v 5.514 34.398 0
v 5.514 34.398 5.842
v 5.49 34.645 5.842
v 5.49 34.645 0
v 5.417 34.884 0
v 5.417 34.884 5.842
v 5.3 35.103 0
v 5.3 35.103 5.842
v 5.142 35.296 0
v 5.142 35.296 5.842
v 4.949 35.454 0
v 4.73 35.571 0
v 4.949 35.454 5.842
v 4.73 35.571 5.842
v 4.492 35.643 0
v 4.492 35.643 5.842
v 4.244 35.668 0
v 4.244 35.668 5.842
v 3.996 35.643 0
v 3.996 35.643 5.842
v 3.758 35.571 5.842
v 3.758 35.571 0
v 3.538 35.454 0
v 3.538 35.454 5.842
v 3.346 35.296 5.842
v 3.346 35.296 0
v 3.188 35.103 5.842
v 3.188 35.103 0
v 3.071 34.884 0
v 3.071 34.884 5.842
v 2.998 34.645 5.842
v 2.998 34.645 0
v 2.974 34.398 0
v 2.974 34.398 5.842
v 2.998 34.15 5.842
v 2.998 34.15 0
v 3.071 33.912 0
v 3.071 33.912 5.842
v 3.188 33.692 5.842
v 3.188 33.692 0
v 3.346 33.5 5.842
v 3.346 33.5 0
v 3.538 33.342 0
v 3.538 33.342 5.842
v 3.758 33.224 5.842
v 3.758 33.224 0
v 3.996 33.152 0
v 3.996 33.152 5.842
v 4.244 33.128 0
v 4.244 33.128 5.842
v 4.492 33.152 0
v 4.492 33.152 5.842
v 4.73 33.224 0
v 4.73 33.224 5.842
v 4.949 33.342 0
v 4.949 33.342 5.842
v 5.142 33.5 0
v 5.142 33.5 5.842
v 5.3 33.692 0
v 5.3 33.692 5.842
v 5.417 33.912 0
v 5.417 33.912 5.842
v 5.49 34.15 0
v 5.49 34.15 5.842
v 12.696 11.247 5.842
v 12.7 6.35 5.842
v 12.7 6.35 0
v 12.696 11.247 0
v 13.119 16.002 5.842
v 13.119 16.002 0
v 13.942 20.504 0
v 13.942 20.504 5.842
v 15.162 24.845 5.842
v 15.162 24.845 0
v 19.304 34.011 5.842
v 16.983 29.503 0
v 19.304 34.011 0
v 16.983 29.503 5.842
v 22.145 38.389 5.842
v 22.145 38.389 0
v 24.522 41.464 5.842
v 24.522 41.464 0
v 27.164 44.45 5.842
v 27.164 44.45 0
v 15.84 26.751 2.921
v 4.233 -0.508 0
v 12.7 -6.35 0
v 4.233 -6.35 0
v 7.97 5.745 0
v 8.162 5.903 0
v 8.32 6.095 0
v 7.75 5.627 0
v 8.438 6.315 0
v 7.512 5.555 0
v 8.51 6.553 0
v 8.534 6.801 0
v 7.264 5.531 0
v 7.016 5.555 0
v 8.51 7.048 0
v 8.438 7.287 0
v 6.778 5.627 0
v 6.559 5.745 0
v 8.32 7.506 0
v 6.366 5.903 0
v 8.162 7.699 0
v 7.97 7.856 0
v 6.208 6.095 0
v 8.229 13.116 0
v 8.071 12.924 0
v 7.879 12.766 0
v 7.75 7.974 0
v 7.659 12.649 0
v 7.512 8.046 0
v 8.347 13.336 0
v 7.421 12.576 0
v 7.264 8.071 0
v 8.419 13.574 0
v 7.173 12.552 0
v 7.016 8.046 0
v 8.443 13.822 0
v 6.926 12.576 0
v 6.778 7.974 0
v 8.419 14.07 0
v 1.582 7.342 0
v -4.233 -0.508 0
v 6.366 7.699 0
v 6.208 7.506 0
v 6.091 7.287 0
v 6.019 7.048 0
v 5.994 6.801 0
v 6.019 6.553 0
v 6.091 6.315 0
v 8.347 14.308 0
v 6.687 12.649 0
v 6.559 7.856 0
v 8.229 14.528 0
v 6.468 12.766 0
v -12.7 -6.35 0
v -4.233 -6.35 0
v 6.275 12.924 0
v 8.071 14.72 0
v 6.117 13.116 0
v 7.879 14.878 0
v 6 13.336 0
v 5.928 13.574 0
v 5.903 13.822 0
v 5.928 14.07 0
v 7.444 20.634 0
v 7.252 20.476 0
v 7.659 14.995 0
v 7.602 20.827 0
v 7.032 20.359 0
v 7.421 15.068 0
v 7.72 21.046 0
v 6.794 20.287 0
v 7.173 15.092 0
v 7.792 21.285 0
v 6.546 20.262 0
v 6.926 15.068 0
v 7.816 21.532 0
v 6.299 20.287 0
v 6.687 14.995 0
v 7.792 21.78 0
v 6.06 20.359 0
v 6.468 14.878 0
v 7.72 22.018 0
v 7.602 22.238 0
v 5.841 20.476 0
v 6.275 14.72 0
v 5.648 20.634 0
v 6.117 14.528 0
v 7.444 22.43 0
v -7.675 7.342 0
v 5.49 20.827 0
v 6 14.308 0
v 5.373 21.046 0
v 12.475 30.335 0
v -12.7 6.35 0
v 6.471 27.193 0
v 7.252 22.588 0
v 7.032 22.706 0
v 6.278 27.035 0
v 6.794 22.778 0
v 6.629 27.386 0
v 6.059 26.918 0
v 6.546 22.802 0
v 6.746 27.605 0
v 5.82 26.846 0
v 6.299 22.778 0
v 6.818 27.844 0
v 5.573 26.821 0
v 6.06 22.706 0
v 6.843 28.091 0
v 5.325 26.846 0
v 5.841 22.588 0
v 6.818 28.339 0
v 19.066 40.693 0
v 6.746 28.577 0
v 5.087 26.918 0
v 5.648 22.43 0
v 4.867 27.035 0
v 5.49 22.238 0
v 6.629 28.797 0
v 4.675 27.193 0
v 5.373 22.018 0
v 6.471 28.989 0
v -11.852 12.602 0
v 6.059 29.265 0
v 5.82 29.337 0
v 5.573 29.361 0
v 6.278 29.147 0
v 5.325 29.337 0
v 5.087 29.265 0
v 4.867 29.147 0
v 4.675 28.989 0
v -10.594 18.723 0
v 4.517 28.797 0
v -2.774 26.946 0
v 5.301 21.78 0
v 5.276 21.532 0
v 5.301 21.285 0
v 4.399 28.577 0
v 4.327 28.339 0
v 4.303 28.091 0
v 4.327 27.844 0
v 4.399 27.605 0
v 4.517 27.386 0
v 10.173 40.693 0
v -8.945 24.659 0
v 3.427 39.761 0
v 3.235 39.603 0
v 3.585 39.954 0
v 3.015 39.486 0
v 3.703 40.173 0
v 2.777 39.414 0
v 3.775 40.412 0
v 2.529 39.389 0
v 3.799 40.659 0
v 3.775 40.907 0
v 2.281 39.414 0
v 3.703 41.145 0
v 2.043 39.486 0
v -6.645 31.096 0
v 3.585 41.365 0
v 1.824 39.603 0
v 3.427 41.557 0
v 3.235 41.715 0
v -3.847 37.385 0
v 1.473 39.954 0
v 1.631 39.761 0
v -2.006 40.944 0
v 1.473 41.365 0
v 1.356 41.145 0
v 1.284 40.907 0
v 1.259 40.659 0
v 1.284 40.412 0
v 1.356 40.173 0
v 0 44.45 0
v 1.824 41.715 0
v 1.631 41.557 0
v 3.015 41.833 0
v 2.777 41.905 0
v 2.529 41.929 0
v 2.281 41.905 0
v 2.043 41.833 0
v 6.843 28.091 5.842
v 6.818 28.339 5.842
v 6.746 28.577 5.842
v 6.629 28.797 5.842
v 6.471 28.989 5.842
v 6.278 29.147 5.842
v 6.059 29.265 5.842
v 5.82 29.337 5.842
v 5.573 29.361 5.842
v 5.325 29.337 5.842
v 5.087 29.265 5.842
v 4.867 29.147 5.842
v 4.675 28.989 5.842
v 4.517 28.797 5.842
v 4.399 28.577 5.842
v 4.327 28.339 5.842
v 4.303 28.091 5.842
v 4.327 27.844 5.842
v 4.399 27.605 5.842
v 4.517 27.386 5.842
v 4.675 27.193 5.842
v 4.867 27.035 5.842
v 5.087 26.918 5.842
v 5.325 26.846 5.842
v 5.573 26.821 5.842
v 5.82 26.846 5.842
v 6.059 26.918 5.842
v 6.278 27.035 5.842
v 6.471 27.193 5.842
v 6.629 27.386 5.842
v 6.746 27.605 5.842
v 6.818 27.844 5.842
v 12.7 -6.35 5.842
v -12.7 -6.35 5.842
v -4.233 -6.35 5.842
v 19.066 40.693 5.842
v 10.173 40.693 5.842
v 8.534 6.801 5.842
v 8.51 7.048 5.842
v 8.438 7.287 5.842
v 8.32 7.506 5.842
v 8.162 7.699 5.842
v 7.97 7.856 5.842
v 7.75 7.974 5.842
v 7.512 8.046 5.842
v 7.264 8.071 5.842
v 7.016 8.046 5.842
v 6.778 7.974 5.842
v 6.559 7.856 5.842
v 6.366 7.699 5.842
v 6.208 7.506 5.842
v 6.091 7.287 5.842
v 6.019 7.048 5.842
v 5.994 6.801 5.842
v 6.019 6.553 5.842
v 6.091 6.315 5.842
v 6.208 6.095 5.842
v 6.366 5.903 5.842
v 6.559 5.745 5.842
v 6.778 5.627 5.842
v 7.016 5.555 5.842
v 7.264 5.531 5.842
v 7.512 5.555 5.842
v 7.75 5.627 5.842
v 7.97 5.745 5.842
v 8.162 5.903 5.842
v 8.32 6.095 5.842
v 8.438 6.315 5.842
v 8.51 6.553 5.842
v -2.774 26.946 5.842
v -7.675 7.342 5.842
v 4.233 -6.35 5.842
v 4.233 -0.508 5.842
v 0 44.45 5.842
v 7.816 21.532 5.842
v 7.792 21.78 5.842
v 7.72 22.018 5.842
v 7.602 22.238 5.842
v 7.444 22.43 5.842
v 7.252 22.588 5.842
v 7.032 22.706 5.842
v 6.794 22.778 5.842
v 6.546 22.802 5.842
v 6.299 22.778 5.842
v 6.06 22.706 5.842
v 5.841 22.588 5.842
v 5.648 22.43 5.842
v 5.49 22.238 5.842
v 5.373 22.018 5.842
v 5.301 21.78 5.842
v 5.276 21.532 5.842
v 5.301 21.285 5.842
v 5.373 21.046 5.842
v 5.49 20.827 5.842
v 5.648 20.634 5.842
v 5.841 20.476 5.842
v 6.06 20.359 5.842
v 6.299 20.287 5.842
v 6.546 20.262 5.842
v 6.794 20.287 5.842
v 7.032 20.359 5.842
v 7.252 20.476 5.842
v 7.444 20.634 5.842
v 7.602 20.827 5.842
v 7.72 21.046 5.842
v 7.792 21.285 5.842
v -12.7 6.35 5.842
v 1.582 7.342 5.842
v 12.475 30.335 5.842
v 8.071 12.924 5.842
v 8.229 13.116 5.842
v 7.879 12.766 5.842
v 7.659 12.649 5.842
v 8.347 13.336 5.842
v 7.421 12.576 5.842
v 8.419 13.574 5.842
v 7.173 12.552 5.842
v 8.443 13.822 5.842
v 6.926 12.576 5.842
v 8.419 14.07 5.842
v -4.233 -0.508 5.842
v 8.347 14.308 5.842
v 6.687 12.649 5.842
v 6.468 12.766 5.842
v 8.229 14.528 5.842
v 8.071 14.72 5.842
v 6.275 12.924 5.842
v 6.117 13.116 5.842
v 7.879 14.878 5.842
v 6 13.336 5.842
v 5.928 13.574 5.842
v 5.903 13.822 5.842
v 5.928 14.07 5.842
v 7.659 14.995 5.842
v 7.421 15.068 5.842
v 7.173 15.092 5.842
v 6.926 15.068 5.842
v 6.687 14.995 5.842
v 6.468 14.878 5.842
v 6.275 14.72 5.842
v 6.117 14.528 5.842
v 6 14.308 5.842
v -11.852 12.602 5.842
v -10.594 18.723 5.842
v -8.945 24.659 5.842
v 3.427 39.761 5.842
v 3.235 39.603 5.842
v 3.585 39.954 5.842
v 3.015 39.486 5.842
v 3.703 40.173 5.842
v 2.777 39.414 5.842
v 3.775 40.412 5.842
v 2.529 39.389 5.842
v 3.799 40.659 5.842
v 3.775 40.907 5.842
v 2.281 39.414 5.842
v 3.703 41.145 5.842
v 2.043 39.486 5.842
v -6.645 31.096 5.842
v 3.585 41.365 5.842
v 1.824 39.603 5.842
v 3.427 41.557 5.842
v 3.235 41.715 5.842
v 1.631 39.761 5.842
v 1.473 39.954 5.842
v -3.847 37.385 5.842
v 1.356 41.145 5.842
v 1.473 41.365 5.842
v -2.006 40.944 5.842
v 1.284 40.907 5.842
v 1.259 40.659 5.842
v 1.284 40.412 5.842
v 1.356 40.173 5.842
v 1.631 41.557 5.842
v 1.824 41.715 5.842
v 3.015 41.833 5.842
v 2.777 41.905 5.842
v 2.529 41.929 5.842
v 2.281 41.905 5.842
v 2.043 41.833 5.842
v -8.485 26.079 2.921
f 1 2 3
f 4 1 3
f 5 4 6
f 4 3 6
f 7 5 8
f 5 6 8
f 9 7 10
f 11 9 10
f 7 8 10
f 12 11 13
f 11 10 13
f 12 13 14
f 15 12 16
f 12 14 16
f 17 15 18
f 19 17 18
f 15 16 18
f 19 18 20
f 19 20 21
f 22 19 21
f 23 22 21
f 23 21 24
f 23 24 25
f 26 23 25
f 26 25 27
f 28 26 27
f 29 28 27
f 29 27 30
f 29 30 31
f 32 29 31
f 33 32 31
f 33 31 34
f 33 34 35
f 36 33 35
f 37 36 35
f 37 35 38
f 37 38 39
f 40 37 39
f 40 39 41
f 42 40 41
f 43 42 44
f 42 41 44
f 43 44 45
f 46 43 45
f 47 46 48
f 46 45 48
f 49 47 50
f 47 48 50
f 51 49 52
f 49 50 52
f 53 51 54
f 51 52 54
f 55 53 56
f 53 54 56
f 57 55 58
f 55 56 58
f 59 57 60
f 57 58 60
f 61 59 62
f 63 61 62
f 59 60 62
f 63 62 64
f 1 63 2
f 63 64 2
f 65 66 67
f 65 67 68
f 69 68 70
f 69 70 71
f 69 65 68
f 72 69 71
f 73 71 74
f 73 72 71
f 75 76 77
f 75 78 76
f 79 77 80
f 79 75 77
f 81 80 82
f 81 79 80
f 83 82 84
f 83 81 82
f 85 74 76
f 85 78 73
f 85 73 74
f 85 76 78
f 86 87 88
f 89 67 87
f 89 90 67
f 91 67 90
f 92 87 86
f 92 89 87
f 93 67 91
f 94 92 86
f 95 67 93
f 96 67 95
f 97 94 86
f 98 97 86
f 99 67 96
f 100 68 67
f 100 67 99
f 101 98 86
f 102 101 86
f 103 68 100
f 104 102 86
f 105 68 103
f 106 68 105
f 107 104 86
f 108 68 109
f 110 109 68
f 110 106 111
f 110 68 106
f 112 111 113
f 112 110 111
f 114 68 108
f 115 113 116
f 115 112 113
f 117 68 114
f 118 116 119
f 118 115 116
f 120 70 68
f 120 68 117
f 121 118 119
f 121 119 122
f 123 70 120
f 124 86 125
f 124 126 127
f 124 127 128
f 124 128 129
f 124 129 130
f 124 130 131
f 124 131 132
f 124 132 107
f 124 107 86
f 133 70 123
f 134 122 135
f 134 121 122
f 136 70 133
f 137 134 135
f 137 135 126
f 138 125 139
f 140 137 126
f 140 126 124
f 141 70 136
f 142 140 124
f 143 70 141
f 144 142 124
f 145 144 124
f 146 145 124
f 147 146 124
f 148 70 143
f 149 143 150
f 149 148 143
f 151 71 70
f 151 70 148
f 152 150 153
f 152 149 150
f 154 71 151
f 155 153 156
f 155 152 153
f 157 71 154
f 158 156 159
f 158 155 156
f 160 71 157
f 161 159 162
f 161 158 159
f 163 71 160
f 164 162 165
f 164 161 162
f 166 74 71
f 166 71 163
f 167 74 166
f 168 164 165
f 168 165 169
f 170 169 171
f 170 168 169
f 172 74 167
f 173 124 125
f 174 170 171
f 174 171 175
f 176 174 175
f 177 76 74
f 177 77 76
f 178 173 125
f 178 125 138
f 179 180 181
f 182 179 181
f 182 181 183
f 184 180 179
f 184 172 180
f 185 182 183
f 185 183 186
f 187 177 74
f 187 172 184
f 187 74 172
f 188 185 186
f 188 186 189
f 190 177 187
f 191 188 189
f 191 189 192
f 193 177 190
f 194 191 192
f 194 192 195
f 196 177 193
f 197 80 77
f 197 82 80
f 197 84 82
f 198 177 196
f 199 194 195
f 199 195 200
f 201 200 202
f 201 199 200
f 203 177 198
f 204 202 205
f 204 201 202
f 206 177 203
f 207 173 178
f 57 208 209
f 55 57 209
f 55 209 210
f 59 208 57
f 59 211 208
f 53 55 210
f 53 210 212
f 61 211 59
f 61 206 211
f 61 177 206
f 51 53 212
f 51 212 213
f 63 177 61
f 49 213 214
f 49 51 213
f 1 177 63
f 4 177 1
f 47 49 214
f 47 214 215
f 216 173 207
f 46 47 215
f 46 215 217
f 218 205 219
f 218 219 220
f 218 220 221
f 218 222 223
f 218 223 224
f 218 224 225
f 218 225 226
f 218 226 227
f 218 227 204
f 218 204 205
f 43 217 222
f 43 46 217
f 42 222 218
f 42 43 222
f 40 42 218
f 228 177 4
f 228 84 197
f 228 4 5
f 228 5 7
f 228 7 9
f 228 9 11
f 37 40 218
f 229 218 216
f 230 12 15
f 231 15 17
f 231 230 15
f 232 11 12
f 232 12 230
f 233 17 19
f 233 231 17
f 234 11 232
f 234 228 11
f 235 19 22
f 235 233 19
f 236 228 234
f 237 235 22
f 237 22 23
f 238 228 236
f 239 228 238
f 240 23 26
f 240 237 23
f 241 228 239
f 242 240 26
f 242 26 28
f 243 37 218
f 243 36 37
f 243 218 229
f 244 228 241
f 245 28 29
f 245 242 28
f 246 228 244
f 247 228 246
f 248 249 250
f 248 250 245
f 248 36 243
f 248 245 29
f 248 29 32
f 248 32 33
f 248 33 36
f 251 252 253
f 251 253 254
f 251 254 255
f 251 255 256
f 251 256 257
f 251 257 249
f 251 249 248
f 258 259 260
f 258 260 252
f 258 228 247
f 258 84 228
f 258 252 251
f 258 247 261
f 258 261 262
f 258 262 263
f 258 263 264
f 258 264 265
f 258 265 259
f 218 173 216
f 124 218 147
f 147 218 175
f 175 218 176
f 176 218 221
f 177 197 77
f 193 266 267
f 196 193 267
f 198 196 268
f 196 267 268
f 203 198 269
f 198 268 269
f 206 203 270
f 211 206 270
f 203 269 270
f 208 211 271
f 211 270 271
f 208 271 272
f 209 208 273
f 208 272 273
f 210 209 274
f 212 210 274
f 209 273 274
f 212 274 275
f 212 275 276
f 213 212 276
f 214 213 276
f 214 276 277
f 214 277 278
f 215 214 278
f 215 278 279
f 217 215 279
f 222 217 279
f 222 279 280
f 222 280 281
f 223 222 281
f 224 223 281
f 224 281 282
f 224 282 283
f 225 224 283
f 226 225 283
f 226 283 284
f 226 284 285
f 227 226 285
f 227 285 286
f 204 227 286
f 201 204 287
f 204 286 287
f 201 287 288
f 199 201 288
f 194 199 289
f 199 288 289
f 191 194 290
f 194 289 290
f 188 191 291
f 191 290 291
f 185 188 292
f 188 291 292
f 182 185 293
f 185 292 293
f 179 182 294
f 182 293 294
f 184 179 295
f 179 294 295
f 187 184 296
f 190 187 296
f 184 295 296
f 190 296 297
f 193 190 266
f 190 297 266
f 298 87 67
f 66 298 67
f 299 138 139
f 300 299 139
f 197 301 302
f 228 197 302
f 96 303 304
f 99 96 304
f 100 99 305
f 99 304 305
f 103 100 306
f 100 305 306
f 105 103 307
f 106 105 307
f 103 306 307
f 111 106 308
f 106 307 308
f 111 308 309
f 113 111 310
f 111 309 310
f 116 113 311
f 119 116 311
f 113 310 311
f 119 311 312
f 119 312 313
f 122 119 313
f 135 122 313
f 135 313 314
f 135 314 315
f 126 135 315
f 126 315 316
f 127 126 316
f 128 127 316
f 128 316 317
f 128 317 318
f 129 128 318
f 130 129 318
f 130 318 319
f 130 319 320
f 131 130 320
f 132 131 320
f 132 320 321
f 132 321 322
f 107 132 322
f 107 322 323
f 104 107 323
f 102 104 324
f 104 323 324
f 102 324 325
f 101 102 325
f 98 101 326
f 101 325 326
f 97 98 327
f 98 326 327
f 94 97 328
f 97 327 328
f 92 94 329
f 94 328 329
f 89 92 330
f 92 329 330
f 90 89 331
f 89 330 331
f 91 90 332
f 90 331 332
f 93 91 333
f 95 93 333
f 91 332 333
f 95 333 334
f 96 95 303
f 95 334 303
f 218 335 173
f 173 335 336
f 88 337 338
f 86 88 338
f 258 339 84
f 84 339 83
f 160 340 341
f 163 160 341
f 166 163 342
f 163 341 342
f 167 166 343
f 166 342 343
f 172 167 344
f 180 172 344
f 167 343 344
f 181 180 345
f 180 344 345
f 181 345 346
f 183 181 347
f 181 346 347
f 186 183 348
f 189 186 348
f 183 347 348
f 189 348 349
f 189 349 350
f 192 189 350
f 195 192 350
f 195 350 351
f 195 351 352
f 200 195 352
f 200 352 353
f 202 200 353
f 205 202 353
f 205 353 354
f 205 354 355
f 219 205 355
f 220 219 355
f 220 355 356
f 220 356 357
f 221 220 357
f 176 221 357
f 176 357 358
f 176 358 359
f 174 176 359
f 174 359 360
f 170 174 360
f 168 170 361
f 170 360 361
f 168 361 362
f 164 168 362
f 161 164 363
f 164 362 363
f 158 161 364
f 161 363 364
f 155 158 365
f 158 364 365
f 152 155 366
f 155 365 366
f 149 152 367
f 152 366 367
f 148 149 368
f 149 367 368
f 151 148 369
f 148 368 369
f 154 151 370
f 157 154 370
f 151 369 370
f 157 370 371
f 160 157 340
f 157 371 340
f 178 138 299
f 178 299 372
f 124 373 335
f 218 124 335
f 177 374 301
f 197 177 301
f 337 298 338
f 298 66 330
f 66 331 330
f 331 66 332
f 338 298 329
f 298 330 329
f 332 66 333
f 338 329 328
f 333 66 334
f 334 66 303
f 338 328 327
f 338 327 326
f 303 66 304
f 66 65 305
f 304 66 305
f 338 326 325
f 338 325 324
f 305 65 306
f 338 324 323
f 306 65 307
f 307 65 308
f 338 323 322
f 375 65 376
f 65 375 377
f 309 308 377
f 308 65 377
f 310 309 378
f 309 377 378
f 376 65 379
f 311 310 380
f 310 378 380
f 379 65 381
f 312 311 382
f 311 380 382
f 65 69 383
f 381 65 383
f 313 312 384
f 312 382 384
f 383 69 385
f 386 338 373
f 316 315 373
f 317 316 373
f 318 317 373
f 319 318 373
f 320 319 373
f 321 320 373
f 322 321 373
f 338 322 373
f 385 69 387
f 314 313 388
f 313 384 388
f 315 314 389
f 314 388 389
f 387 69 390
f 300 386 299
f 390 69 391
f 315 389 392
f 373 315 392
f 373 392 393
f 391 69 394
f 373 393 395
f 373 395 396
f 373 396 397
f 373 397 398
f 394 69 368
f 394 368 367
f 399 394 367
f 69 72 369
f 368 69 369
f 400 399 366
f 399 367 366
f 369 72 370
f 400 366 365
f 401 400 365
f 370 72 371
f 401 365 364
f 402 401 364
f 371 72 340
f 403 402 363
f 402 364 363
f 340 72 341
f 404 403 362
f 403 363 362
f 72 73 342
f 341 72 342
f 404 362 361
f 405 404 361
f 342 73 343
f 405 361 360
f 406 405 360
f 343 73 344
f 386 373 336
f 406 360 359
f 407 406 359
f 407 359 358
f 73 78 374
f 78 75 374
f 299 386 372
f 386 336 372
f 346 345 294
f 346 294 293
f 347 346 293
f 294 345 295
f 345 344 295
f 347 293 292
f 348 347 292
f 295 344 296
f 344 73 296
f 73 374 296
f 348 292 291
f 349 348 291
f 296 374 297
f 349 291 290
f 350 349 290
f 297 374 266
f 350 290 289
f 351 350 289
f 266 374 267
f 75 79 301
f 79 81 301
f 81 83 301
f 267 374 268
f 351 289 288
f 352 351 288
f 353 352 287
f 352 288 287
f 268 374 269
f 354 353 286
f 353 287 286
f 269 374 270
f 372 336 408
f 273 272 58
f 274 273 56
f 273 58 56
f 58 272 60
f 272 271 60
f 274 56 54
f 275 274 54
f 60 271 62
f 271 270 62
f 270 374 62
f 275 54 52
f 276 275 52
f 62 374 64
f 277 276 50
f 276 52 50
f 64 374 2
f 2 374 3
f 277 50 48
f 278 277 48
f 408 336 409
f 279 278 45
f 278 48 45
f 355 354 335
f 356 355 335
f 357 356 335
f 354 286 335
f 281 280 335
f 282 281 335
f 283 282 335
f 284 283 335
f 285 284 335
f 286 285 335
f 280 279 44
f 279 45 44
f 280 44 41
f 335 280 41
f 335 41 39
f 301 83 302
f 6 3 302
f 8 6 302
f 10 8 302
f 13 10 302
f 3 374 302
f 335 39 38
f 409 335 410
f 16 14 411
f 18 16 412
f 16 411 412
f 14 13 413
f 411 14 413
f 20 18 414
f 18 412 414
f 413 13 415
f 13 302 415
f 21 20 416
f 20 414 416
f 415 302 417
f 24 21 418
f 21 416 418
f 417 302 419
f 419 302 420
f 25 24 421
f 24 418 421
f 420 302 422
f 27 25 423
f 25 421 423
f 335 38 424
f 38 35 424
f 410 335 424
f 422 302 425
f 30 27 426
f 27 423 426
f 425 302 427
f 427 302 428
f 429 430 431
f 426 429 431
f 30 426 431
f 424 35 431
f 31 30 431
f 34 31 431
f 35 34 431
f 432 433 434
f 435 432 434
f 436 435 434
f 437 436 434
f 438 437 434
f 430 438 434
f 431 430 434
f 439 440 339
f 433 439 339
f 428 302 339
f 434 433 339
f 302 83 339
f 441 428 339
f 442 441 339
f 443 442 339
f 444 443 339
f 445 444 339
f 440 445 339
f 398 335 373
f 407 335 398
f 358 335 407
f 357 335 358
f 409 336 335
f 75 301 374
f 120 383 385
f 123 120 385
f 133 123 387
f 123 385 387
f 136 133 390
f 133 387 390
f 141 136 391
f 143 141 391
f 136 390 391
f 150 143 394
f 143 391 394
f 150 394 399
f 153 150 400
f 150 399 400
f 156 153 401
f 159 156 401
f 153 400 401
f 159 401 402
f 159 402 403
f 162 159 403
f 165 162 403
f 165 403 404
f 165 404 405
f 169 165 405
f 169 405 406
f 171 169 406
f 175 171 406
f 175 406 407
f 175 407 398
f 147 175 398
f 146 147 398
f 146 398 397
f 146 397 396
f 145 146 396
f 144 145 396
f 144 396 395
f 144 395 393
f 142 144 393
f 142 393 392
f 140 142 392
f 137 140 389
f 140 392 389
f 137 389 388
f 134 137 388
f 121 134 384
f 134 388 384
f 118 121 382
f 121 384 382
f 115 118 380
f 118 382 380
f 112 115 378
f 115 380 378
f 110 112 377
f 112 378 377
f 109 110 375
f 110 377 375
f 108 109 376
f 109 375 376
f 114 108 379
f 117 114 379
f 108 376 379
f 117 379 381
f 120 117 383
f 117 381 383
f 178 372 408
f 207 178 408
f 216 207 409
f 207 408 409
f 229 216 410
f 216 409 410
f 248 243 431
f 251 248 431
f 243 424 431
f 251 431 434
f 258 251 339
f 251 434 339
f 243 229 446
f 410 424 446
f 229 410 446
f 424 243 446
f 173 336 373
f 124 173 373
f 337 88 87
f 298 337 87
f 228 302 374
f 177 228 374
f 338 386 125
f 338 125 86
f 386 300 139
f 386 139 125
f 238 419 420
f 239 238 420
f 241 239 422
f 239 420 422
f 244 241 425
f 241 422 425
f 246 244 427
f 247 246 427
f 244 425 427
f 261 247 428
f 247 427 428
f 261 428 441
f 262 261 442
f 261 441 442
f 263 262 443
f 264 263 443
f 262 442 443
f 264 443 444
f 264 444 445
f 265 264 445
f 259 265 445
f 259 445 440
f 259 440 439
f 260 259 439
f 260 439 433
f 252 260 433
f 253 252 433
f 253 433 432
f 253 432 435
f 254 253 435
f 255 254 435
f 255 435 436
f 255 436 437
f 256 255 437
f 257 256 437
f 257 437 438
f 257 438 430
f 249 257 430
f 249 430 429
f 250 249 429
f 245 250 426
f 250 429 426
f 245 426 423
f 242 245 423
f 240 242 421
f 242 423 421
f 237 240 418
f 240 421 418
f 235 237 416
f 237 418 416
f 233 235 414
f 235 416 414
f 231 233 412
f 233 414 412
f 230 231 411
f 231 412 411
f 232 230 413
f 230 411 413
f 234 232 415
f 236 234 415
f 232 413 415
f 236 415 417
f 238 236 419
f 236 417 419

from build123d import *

# Parameters (mm, degrees)
SKETCH3_W           = 25.4
SKETCH3_H           = 12.7
BOSS_EXTRUDE2_DEPTH = 5.842
SKETCH4_W           = 8.466666666
SKETCH4_H           = 5.842
CUT_EXTRUDE1_DEPTH  = 16.35387456
BOSS_EXTRUDE3_DEPTH = 5.842
SKETCH10_R          = 1.27
CUT_EXTRUDE8_DEPTH  = 7.62
SKETCH12_R          = 1.27
CUT_EXTRUDE9_DEPTH  = 7.62
CUT_EXTRUDE10_DEPTH = 7.62


with BuildPart() as part:
    # Sketch3 → Boss-Extrude2 (new body)
    with BuildSketch(Plane.XY):
        Rectangle(SKETCH3_W, SKETCH3_H)
    extrude(amount=BOSS_EXTRUDE2_DEPTH)

    # Sketch4 → Cut-Extrude1 (cut, through all)
    with BuildSketch(Plane.XY.offset(5.842)):
        with Locations((0, -3.429)):
            Rectangle(SKETCH4_W, SKETCH4_H)
    extrude(amount=-CUT_EXTRUDE1_DEPTH, mode=Mode.SUBTRACT)

    # Sketch5 → Boss-Extrude3 (add)
    with BuildSketch(Plane.XY.offset(5.842)):
        with BuildLine():
            Line((0, 44.45), (27.164431218, 44.45))
            add(Edge.make_bspline(
                [(12.7, 6.35), (11.748773867, 28.101932144), (27.164431218, 44.45)],
                knots=[0, 0, 0, 1, 1, 1], degree=2))
            Line((12.7, 6.35), (-12.7, 6.35))
            add(Edge.make_bspline(
                [(-12.7, 6.35), (-10.61981434, 26.757908534), (0, 44.45)],
                knots=[0, 0, 0, 1, 1, 1], degree=2))
        make_face()
    extrude(amount=-BOSS_EXTRUDE3_DEPTH)

    # Sketch10 → Cut-Extrude8 (cut)
    with BuildSketch(Plane.XY.offset(5.842)):
        with Locations((7.264189007, 6.800526763)):
            Circle(SKETCH10_R)
    extrude(amount=-CUT_EXTRUDE8_DEPTH, mode=Mode.SUBTRACT)

    # Sketch12 → Cut-Extrude9 (cut)
    with BuildSketch(Plane.XY.offset(5.842)):
        with Locations((5.572598549, 28.091285842)):
            Circle(SKETCH12_R)
        with Locations((6.546271927, 21.532393633)):
            Circle(SKETCH12_R)
        with Locations((7.173302087, 13.821975993)):
            Circle(SKETCH12_R)
        with Locations((2.529205303, 40.659348041)):
            Circle(SKETCH12_R)
        with Locations((4.243902878, 34.397725849)):
            Circle(SKETCH12_R)
    extrude(amount=-CUT_EXTRUDE9_DEPTH, mode=Mode.SUBTRACT)

    # Sketch13 → Cut-Extrude10 (cut)
    with BuildSketch(Plane.XY.offset(5.842)):
        Polygon((-2.774085904, 26.946129085), (-7.675131543, 7.341946529), (1.582399109, 7.341946529), align=None)
        Polygon((10.172842992, 40.693017541), (12.474681541, 30.334744073), (19.066310112, 40.693017541), align=None)
    extrude(amount=-CUT_EXTRUDE10_DEPTH, mode=Mode.SUBTRACT)


solid = part.part
